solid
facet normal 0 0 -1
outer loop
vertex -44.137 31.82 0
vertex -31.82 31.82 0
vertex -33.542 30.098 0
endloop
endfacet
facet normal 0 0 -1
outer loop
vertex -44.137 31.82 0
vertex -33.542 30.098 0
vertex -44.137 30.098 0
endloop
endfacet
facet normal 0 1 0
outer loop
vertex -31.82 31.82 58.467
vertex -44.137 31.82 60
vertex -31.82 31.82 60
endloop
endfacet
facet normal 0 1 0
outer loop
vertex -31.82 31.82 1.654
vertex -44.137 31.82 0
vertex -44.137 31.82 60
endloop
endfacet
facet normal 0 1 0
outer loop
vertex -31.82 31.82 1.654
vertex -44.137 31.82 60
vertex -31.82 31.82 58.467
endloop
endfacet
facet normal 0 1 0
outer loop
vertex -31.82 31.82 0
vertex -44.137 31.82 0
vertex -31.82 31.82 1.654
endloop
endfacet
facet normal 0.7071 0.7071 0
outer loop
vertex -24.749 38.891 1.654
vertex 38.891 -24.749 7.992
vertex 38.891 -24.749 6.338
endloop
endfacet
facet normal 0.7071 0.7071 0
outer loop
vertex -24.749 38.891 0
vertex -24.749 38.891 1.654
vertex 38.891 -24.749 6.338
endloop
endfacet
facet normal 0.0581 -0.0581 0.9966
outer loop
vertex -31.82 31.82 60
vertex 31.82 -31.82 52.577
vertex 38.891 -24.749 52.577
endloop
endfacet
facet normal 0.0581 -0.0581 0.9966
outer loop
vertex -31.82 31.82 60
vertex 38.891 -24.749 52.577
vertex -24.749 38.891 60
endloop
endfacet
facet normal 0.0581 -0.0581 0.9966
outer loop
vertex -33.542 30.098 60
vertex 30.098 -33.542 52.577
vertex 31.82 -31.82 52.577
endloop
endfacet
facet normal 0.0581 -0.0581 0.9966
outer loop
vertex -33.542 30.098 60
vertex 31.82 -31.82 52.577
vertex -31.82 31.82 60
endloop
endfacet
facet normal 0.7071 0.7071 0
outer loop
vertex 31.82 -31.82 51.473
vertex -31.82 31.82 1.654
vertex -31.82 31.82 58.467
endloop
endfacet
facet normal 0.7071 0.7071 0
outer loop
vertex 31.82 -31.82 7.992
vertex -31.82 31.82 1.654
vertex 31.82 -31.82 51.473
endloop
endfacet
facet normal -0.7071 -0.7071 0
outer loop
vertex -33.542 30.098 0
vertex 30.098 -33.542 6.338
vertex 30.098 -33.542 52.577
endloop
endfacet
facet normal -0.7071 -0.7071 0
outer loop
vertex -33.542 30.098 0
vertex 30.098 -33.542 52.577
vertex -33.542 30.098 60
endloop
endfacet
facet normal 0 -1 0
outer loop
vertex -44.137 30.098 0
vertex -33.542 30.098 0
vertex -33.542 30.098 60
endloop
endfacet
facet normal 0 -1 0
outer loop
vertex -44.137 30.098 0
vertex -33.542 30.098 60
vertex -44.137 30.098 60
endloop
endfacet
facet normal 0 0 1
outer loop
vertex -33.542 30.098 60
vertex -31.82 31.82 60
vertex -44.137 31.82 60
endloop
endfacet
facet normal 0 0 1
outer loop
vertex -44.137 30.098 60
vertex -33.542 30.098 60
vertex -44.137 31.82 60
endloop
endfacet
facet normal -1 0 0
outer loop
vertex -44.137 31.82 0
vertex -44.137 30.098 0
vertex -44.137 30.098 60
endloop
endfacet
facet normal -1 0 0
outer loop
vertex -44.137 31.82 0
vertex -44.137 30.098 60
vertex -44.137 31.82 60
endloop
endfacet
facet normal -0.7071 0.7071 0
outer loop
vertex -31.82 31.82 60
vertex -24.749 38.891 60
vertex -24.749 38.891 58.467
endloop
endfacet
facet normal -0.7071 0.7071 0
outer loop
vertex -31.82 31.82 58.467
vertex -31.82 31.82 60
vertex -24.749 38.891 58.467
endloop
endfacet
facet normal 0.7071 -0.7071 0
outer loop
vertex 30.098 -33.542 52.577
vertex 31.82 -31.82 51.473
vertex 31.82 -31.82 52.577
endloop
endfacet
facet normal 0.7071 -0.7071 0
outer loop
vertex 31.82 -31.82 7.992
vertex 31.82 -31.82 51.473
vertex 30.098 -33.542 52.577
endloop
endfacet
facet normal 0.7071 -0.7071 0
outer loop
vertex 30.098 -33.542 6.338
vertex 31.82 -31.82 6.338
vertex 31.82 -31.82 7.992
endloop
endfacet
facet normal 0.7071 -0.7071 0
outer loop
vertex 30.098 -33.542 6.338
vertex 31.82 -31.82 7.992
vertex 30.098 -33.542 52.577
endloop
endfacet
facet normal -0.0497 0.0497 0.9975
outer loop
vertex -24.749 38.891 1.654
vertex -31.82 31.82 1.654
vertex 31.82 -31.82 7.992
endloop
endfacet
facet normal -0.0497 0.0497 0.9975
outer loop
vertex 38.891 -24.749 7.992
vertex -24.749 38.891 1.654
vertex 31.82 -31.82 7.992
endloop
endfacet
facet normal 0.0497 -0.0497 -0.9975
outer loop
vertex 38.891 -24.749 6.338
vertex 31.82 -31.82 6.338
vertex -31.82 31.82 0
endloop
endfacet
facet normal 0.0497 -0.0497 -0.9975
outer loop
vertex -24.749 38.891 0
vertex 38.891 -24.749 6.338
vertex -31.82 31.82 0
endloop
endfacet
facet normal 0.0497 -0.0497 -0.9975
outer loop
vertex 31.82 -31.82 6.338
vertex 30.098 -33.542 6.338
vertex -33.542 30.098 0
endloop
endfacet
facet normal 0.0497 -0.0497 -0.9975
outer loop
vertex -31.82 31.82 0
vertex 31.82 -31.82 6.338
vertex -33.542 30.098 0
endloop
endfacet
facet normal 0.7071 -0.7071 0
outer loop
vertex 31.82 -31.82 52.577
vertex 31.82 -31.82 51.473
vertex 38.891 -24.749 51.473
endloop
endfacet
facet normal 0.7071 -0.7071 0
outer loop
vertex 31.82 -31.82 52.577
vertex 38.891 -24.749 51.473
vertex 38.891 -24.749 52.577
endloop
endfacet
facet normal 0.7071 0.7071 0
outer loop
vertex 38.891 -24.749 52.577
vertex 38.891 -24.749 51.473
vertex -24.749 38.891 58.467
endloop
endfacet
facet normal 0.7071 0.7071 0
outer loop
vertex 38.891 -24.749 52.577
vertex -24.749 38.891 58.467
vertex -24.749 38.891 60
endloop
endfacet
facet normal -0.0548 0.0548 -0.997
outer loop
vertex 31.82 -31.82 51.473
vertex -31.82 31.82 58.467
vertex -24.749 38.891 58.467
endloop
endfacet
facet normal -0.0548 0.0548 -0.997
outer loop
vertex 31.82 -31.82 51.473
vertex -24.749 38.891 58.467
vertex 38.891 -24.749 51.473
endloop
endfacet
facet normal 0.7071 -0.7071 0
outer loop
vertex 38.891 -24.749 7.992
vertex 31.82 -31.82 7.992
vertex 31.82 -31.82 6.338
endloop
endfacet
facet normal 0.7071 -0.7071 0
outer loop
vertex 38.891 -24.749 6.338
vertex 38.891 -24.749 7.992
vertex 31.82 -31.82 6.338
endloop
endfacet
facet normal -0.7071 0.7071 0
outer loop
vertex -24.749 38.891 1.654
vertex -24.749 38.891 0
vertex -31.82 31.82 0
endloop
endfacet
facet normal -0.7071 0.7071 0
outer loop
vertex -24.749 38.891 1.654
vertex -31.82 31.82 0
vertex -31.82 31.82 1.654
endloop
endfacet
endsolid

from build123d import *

# Parameters (mm, degrees)
BOSS_EXTRUDE1_DEPTH          = 60
CUT_EXTRUDE_THIN3_DEPTH      = 82.68933693
CUT_EXTRUDE_THIN3_DEPTH_BACK = 82.68933693
CUT_EXTRUDE_THIN4_DEPTH      = 82.68933693
CUT_EXTRUDE_THIN4_DEPTH_BACK = 82.68933693
BOSS_EXTRUDE4_DEPTH          = 10
BOSS_EXTRUDE5_DEPTH          = 10


with BuildPart() as part:
    # Sketch1 → Boss-Extrude1 (new body)
    with BuildSketch(Plane.XY):
        Polygon((-31.819805153, 31.819805153), (31.819805153, -31.819805153), (30.097767276, -33.541843031), (-33.541843031, 30.097767276), (-44.137201249, 30.097767276), (-44.137201249, 31.819805153), align=None)
    extrude(amount=BOSS_EXTRUDE1_DEPTH)

    # Sketch6 → Cut-Extrude-Thin3 (cut, two sides: drawn at the far end of the back side and taken through both)
    with BuildSketch(Plane(origin=(0, 0, 0), x_dir=(0.7071067811865561, -0.7071067811865389, 0), z_dir=(0.7071067811865389, 0.7071067811865561, 0)).offset(-CUT_EXTRUDE_THIN3_DEPTH_BACK)):
        Polygon((-45, -60), (45, -52.5774462), (86.096881173, -550.885630317), (-3.903118827, -558.308184117), align=None)
    extrude(amount=CUT_EXTRUDE_THIN3_DEPTH + CUT_EXTRUDE_THIN3_DEPTH_BACK, mode=Mode.SUBTRACT)

    # Sketch7 → Cut-Extrude-Thin4 (cut, two sides: drawn at the far end of the back side and taken through both)
    with BuildSketch(Plane(origin=(0, 0, 0), x_dir=(0.7071067811865561, -0.7071067811865389, 0), z_dir=(0.7071067811865389, 0.7071067811865561, 0)).offset(-CUT_EXTRUDE_THIN4_DEPTH_BACK)):
        Polygon((-45, 0), (45, -6.337900888), (80.123576931, 492.426907757), (-9.876423069, 498.764808646), align=None)
    extrude(amount=CUT_EXTRUDE_THIN4_DEPTH + CUT_EXTRUDE_THIN4_DEPTH_BACK, mode=Mode.SUBTRACT)

    # Sketch8 → Boss-Extrude4 (add)
    with BuildSketch(Plane(origin=(0, 0, 0), x_dir=(0, 0, -1), z_dir=(0.7071067811865389, 0.7071067811865561, 0))):
        Polygon((-60, 45), (-58.467214774, 45), (-51.473114592, -45), (-52.5774462, -45), align=None)
    extrude(amount=BOSS_EXTRUDE4_DEPTH)

    # Sketch9 → Boss-Extrude5 (add)
    with BuildSketch(Plane(origin=(0, 0, 0), x_dir=(0, 0, -1), z_dir=(0.7071067811865389, 0.7071067811865561, 0))):
        Polygon((-6.337900888, -45), (0, 45), (-1.653616098, 45), (-7.991516987, -45), align=None)
    extrude(amount=BOSS_EXTRUDE5_DEPTH)


solid = part.part
